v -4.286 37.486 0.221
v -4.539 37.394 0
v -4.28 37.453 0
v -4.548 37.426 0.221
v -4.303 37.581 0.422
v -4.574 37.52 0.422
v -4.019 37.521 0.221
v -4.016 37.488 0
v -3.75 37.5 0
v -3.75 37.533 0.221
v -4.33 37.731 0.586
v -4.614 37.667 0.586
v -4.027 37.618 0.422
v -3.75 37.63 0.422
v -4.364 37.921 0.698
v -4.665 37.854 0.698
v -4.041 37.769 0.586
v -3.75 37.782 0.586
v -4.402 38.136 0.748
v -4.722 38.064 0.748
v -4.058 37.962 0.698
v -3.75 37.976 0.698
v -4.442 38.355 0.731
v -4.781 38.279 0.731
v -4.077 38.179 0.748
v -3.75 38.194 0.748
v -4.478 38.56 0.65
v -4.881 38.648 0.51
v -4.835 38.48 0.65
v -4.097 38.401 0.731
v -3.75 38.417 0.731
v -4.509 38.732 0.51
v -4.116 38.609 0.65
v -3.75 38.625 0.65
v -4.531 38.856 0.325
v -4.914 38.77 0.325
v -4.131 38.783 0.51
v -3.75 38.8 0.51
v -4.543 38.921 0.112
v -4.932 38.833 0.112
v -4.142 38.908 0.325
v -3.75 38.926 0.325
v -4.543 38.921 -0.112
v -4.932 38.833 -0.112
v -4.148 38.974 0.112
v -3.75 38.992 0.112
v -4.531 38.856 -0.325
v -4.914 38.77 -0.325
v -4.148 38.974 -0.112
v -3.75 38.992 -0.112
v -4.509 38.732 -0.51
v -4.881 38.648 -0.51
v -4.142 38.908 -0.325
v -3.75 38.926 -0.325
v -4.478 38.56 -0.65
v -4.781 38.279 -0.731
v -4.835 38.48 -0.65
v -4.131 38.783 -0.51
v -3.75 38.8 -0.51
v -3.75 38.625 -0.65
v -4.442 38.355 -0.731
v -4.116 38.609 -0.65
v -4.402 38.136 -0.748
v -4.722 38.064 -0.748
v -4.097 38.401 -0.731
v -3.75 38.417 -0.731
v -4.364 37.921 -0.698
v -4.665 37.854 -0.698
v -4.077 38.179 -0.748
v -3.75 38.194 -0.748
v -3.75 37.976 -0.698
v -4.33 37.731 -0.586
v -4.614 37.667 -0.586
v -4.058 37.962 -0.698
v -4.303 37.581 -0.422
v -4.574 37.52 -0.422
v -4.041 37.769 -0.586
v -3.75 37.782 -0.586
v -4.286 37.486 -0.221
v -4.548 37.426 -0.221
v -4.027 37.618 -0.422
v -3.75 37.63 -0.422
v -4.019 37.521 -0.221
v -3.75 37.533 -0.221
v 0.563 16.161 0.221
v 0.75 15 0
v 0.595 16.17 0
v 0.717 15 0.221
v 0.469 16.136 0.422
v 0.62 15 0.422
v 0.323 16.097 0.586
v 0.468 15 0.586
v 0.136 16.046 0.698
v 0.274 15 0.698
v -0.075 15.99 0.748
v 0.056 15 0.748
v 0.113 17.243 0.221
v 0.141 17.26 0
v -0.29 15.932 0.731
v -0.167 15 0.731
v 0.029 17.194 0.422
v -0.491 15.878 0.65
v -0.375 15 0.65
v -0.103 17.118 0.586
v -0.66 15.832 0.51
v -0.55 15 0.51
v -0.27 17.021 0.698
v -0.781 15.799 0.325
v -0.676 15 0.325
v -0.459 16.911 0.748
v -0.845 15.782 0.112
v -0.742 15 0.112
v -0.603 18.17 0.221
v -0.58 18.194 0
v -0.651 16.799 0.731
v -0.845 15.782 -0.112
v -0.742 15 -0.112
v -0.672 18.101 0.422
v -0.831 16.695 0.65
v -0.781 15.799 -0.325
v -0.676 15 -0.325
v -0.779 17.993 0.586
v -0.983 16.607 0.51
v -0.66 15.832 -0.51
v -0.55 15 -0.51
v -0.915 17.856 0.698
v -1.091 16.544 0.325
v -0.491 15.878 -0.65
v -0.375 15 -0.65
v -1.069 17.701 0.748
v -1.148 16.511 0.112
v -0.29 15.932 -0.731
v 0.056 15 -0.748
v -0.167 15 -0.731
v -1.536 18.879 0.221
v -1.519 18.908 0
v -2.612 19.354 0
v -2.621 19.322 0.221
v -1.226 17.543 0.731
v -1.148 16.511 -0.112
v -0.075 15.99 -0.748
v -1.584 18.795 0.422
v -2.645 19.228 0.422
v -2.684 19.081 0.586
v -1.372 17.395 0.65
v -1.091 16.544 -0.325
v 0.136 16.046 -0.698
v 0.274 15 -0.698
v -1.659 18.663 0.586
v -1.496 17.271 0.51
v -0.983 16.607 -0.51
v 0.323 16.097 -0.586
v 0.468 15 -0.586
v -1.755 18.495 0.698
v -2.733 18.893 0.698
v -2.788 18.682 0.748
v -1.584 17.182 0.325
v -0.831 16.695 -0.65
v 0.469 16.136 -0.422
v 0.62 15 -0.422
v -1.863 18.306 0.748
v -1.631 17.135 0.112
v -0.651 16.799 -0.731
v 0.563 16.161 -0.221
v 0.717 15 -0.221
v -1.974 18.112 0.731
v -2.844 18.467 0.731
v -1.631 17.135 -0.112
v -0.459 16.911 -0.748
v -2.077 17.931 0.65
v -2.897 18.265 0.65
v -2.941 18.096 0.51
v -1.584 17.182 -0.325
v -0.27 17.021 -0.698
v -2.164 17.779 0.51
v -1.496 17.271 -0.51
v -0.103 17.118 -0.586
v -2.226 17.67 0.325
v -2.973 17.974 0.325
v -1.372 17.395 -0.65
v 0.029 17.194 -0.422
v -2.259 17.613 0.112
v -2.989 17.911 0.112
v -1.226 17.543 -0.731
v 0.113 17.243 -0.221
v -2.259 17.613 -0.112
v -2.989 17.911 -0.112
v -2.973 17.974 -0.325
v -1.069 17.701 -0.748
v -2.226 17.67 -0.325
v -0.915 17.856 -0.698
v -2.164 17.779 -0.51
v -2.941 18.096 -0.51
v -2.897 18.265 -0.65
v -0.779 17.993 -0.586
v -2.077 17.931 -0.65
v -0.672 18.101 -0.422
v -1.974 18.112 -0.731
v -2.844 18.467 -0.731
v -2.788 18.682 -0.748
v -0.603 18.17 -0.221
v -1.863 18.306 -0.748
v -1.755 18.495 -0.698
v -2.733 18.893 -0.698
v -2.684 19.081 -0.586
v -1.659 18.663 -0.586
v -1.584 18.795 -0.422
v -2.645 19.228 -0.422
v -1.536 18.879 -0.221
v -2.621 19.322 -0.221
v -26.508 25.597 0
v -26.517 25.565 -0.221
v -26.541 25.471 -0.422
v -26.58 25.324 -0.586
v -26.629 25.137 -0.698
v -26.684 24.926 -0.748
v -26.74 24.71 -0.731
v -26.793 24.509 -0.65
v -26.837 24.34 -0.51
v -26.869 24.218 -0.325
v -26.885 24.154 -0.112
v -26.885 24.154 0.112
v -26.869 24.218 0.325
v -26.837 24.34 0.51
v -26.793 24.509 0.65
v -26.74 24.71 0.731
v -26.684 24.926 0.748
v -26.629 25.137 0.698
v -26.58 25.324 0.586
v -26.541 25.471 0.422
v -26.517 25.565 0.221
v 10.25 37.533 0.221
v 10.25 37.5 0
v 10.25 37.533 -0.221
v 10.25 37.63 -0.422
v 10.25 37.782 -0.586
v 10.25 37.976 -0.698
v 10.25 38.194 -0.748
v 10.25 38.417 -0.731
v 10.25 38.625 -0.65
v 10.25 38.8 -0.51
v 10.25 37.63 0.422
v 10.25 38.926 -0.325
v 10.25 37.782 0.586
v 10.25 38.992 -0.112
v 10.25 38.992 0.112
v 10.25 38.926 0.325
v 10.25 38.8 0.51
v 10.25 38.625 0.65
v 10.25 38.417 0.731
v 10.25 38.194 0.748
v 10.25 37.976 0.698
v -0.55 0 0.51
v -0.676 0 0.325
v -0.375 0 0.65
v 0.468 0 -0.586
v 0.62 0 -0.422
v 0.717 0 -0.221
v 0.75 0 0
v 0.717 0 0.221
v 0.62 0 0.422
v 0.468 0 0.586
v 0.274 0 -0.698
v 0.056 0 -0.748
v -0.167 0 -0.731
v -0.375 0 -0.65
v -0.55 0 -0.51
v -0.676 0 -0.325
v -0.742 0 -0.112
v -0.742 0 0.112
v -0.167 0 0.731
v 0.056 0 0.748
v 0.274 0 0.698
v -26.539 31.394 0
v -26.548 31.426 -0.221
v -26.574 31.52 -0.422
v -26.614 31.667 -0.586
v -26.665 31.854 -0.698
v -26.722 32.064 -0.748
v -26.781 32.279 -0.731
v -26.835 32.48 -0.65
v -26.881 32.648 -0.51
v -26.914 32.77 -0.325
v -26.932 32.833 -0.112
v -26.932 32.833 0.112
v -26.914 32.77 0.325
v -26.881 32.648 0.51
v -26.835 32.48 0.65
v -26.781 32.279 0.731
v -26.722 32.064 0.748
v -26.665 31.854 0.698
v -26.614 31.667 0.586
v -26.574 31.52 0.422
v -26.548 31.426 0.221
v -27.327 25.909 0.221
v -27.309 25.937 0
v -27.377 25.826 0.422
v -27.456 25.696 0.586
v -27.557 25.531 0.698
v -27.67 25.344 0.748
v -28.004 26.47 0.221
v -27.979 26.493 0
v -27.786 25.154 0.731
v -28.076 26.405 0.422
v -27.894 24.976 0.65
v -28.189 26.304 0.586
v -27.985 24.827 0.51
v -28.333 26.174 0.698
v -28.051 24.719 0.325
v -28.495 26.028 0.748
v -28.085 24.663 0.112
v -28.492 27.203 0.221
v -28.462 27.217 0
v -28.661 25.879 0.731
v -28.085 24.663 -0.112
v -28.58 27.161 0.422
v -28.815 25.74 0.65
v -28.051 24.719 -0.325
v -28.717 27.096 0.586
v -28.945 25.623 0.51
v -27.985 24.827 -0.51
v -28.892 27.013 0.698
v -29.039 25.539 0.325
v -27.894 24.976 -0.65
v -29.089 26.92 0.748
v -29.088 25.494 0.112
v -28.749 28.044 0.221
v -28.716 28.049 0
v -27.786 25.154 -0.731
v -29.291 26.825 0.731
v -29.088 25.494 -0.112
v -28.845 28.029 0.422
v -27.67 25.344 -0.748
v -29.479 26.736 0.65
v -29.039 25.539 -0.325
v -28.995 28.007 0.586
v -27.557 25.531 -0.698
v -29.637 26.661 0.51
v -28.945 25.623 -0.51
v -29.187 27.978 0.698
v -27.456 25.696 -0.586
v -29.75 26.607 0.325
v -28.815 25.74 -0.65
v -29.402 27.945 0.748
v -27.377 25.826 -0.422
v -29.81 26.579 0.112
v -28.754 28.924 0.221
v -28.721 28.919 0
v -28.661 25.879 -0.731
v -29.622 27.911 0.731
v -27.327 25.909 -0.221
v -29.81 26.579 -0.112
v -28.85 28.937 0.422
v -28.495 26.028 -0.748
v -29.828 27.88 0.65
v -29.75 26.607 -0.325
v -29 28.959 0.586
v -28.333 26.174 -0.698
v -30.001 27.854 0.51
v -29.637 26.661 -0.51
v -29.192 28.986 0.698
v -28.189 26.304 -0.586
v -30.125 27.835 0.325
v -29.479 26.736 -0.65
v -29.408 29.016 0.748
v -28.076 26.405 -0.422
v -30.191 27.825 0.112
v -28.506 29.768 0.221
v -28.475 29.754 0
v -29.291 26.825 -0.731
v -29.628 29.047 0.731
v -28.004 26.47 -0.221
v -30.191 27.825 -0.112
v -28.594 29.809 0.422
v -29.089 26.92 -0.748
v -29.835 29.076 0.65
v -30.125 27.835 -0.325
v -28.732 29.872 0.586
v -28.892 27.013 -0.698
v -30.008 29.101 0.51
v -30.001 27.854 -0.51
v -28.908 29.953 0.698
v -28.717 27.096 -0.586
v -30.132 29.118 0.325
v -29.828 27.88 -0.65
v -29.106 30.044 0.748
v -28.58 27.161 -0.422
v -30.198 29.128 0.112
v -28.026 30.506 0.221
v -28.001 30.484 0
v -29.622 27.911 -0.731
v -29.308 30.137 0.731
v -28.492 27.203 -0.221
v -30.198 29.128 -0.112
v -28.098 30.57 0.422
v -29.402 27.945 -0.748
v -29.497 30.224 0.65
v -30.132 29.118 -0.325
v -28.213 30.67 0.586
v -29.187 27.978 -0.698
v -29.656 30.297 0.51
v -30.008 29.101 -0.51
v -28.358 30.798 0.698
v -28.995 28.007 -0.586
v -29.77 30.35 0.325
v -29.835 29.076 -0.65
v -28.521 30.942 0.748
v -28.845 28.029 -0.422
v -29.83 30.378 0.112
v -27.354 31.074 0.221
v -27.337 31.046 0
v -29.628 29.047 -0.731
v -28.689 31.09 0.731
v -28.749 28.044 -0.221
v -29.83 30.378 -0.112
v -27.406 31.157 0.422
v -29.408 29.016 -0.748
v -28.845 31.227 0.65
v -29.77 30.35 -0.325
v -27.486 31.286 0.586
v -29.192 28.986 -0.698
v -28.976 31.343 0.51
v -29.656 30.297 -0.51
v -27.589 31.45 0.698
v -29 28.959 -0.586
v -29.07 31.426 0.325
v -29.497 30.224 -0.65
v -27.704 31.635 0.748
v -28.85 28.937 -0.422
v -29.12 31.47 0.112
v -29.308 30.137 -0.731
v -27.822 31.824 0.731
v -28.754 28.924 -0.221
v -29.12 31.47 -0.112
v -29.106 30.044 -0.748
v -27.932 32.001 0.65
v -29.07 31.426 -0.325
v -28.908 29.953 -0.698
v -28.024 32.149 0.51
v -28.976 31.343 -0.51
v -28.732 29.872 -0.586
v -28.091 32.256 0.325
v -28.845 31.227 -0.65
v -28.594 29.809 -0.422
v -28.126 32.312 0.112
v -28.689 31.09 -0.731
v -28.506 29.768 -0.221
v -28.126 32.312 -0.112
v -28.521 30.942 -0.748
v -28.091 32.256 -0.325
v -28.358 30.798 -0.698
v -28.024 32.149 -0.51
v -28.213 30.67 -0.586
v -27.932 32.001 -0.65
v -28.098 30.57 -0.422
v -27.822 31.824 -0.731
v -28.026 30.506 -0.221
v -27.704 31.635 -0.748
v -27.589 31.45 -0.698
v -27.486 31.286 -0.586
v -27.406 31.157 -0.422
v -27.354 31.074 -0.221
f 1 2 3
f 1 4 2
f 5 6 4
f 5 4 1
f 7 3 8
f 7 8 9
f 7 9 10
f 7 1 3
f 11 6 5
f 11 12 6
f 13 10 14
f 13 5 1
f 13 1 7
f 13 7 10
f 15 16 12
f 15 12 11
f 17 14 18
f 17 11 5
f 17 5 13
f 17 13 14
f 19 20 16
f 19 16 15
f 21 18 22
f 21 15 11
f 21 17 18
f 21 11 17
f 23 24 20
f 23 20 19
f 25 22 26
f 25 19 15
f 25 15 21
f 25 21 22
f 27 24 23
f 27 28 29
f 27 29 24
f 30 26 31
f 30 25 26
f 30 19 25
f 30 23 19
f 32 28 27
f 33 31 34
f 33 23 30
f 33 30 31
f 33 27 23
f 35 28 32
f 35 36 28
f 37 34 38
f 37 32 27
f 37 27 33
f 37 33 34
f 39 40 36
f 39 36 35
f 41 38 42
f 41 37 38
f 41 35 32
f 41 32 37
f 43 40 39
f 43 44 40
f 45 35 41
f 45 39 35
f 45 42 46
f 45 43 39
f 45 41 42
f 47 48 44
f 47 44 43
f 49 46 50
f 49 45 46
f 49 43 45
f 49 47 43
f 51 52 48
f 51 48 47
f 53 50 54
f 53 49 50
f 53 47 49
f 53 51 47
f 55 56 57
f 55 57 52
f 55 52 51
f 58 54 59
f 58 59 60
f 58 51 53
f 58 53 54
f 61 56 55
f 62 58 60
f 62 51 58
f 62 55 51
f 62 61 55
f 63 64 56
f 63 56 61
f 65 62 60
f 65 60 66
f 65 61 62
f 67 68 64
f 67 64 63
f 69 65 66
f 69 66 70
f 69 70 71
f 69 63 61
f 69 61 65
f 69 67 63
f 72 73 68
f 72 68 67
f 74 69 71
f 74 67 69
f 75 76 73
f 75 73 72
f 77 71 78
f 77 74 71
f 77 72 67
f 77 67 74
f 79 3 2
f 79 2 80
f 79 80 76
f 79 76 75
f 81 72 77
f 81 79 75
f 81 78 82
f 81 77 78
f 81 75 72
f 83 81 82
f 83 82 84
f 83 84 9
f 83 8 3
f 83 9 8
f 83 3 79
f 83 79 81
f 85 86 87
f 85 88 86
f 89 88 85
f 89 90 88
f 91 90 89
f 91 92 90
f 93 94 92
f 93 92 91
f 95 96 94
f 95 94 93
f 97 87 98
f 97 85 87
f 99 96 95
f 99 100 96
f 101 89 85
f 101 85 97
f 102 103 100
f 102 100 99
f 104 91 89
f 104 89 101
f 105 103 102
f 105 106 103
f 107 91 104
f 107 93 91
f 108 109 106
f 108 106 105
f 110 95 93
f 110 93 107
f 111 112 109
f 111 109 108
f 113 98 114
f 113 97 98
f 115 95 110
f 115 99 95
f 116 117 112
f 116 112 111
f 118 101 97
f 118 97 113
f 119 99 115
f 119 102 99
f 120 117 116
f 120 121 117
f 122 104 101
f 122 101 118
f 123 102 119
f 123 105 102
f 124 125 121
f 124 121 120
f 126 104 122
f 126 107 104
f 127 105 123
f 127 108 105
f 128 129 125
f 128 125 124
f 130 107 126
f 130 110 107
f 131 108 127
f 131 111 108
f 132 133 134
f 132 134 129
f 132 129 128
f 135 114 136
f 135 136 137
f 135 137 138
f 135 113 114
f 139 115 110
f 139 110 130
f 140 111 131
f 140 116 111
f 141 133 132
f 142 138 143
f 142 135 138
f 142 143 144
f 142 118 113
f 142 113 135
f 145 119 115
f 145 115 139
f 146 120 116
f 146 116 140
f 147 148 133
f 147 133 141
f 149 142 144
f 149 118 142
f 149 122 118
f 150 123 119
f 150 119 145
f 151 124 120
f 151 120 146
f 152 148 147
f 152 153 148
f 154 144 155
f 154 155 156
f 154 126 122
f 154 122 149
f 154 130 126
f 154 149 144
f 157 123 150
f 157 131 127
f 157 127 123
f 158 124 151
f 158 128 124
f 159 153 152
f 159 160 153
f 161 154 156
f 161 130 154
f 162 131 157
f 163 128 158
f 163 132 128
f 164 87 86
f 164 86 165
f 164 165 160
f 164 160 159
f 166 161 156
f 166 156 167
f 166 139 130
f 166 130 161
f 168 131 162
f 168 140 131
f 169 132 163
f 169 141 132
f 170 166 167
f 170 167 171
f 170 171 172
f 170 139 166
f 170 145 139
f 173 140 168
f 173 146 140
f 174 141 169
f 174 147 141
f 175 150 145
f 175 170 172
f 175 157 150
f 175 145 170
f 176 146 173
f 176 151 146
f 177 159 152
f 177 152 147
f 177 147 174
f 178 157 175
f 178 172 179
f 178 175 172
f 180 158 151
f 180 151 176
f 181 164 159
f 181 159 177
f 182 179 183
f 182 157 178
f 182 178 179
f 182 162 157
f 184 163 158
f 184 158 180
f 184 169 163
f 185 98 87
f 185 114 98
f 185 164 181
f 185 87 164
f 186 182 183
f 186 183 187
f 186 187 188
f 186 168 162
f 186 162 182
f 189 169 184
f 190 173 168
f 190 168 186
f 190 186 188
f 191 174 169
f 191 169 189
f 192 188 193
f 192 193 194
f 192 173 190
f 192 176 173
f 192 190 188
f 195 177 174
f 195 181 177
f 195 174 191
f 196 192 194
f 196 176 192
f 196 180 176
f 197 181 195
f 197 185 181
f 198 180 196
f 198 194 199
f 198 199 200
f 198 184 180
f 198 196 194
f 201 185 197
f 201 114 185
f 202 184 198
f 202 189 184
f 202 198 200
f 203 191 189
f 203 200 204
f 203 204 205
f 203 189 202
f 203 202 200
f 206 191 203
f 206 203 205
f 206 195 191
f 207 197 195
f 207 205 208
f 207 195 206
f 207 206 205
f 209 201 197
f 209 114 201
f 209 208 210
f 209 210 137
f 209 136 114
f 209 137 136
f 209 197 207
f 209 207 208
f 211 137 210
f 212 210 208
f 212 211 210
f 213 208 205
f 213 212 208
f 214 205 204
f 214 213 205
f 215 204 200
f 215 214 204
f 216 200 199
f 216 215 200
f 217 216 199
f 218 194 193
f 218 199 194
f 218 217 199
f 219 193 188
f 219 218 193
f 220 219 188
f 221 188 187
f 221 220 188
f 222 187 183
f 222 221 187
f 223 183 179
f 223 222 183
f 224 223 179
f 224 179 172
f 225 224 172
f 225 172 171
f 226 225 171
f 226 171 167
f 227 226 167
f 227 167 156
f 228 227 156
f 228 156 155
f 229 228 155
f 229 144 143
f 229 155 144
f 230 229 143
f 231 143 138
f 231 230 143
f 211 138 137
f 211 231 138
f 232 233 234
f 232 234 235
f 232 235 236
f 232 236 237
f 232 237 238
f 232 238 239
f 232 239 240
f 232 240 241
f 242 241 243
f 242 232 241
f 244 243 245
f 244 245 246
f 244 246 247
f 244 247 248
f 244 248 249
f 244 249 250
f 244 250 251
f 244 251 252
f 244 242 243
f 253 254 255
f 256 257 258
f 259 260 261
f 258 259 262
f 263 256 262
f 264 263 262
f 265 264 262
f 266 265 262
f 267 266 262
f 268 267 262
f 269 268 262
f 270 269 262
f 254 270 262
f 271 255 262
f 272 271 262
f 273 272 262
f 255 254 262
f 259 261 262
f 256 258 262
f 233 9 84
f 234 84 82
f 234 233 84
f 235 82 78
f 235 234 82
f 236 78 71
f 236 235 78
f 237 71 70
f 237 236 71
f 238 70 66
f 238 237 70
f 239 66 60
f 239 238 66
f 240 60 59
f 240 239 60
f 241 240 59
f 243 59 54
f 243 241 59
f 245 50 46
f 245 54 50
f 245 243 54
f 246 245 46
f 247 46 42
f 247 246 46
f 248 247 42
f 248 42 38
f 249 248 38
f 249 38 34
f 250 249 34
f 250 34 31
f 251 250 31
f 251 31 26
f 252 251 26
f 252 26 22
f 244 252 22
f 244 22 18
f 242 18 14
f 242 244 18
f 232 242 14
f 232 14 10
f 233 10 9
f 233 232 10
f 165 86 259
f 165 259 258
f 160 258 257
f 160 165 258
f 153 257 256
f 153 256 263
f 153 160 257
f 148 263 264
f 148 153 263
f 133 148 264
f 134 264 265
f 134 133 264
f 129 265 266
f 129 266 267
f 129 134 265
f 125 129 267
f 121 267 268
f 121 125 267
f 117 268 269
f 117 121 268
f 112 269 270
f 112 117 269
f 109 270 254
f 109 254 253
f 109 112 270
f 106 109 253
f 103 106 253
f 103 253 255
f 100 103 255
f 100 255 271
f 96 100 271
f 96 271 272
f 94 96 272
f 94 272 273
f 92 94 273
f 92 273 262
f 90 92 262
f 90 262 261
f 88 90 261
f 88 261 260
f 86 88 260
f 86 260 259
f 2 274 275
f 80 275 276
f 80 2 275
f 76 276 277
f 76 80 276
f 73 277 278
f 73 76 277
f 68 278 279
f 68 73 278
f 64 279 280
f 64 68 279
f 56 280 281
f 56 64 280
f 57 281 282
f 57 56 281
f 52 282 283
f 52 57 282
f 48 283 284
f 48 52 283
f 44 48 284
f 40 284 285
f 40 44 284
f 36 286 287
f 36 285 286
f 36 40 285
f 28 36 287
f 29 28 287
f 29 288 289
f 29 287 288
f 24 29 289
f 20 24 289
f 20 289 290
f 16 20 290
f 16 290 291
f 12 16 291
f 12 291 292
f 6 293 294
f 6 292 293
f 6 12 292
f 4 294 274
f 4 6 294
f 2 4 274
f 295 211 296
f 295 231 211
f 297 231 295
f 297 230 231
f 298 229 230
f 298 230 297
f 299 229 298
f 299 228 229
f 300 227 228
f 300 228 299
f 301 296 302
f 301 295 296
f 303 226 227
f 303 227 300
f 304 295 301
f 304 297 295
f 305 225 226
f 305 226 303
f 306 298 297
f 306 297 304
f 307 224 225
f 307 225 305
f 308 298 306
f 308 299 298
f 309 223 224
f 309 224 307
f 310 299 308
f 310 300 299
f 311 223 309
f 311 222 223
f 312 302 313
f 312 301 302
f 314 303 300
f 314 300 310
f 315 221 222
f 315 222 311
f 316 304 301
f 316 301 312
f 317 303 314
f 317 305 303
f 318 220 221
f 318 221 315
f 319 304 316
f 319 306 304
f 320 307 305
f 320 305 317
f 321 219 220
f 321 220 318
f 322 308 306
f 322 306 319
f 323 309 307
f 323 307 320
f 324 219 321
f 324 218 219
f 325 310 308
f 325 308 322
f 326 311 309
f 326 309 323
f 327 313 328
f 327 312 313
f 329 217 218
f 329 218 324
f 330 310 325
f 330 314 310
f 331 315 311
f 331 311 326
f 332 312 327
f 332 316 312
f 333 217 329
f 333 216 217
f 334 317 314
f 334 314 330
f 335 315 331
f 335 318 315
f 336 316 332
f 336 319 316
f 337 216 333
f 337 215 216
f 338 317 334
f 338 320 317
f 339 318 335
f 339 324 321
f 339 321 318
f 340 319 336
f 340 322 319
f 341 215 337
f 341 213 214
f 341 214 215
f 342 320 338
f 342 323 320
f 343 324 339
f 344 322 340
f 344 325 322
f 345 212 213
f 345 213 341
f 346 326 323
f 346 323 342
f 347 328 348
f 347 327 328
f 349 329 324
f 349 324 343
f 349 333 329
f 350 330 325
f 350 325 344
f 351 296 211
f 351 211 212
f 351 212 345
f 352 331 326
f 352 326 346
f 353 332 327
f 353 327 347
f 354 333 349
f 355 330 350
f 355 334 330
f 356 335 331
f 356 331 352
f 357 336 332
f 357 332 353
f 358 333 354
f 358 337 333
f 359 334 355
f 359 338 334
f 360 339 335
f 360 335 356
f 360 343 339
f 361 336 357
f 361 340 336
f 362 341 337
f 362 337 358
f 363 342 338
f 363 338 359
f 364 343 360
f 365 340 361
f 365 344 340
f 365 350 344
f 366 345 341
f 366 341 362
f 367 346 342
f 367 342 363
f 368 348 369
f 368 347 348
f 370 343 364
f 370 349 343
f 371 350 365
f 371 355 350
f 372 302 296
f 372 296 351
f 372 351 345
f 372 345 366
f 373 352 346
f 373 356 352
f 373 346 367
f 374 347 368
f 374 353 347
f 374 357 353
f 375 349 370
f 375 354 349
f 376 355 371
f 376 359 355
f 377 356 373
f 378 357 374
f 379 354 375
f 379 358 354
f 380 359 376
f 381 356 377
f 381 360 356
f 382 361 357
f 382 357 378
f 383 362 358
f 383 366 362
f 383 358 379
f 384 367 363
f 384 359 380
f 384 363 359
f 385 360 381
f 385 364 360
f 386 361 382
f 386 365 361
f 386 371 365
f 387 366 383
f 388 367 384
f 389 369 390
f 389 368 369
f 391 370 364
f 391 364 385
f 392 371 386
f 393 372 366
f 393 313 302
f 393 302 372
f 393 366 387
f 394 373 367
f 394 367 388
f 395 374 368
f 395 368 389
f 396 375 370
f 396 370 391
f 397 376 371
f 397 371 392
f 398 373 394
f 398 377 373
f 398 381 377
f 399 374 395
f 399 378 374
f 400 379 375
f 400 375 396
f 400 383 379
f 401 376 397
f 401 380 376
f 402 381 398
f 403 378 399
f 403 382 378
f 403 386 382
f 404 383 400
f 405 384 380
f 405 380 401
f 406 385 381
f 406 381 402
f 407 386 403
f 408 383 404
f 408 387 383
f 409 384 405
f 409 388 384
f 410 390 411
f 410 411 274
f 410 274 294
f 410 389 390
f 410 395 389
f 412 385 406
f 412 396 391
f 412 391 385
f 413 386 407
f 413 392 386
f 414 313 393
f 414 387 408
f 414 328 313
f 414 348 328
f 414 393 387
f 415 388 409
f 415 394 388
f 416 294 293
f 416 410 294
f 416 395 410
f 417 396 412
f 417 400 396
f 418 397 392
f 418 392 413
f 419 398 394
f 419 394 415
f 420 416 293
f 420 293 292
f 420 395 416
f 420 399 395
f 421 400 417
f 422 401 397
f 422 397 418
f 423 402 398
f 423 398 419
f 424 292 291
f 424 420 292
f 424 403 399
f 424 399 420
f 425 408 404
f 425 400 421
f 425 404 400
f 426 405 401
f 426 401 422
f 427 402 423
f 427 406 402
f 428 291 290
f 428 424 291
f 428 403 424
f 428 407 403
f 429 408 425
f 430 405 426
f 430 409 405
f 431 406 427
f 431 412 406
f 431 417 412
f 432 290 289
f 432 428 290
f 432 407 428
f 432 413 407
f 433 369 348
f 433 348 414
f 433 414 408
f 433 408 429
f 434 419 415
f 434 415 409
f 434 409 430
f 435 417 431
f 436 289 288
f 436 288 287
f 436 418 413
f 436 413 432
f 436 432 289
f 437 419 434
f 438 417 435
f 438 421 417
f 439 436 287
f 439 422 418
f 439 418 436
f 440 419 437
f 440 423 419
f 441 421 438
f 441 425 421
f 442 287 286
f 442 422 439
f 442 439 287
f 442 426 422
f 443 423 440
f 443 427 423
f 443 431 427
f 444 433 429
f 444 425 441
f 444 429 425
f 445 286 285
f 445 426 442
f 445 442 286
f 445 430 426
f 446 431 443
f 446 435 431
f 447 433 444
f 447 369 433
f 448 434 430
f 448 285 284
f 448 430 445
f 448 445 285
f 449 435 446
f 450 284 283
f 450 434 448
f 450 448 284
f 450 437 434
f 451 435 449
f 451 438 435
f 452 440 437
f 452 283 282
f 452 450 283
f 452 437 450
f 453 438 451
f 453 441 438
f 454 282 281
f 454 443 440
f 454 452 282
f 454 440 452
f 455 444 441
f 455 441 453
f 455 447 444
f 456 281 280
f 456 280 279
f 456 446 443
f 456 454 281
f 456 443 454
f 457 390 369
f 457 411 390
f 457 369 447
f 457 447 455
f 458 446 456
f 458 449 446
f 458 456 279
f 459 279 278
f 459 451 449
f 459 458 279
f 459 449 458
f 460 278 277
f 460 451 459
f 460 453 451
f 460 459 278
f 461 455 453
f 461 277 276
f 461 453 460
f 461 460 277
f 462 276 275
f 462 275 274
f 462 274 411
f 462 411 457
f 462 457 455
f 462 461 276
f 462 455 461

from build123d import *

# Parameters (mm, degrees)
SKIZZE2_R = 0.75


with BuildPart() as part:
    # Austragung1: sweep along a path in Skizze1
    with BuildLine(Plane.XY) as austragung1_path:
        Line((0, 0), (0, 15))
        ThreePointArc((0, 15), (-0.782050775, 17.292111995), (-2.802014612, 18.62819841))
        Line((-2.802014612, 18.62819841), (-26.697985388, 24.87180159))
        ThreePointArc((-26.697985388, 24.87180159), (-29.499946504, 28.47996964), (-26.736690272, 32.11786433))
        Line((-26.736690272, 32.11786433), (-4.736690272, 38.11786433))
        ThreePointArc((-4.736690272, 38.11786433), (-4.247749316, 38.216819288), (-3.75, 38.25))
        Line((-3.75, 38.25), (10.25, 38.25))
    # Skizze2 → Austragung1 (sweep)
    with BuildSketch(Plane(origin=(0, 0, 0), x_dir=(1, 0, 0), z_dir=(0, 1, 0))):
        Circle(SKIZZE2_R)
    sweep(path=austragung1_path.line)


solid = part.part
